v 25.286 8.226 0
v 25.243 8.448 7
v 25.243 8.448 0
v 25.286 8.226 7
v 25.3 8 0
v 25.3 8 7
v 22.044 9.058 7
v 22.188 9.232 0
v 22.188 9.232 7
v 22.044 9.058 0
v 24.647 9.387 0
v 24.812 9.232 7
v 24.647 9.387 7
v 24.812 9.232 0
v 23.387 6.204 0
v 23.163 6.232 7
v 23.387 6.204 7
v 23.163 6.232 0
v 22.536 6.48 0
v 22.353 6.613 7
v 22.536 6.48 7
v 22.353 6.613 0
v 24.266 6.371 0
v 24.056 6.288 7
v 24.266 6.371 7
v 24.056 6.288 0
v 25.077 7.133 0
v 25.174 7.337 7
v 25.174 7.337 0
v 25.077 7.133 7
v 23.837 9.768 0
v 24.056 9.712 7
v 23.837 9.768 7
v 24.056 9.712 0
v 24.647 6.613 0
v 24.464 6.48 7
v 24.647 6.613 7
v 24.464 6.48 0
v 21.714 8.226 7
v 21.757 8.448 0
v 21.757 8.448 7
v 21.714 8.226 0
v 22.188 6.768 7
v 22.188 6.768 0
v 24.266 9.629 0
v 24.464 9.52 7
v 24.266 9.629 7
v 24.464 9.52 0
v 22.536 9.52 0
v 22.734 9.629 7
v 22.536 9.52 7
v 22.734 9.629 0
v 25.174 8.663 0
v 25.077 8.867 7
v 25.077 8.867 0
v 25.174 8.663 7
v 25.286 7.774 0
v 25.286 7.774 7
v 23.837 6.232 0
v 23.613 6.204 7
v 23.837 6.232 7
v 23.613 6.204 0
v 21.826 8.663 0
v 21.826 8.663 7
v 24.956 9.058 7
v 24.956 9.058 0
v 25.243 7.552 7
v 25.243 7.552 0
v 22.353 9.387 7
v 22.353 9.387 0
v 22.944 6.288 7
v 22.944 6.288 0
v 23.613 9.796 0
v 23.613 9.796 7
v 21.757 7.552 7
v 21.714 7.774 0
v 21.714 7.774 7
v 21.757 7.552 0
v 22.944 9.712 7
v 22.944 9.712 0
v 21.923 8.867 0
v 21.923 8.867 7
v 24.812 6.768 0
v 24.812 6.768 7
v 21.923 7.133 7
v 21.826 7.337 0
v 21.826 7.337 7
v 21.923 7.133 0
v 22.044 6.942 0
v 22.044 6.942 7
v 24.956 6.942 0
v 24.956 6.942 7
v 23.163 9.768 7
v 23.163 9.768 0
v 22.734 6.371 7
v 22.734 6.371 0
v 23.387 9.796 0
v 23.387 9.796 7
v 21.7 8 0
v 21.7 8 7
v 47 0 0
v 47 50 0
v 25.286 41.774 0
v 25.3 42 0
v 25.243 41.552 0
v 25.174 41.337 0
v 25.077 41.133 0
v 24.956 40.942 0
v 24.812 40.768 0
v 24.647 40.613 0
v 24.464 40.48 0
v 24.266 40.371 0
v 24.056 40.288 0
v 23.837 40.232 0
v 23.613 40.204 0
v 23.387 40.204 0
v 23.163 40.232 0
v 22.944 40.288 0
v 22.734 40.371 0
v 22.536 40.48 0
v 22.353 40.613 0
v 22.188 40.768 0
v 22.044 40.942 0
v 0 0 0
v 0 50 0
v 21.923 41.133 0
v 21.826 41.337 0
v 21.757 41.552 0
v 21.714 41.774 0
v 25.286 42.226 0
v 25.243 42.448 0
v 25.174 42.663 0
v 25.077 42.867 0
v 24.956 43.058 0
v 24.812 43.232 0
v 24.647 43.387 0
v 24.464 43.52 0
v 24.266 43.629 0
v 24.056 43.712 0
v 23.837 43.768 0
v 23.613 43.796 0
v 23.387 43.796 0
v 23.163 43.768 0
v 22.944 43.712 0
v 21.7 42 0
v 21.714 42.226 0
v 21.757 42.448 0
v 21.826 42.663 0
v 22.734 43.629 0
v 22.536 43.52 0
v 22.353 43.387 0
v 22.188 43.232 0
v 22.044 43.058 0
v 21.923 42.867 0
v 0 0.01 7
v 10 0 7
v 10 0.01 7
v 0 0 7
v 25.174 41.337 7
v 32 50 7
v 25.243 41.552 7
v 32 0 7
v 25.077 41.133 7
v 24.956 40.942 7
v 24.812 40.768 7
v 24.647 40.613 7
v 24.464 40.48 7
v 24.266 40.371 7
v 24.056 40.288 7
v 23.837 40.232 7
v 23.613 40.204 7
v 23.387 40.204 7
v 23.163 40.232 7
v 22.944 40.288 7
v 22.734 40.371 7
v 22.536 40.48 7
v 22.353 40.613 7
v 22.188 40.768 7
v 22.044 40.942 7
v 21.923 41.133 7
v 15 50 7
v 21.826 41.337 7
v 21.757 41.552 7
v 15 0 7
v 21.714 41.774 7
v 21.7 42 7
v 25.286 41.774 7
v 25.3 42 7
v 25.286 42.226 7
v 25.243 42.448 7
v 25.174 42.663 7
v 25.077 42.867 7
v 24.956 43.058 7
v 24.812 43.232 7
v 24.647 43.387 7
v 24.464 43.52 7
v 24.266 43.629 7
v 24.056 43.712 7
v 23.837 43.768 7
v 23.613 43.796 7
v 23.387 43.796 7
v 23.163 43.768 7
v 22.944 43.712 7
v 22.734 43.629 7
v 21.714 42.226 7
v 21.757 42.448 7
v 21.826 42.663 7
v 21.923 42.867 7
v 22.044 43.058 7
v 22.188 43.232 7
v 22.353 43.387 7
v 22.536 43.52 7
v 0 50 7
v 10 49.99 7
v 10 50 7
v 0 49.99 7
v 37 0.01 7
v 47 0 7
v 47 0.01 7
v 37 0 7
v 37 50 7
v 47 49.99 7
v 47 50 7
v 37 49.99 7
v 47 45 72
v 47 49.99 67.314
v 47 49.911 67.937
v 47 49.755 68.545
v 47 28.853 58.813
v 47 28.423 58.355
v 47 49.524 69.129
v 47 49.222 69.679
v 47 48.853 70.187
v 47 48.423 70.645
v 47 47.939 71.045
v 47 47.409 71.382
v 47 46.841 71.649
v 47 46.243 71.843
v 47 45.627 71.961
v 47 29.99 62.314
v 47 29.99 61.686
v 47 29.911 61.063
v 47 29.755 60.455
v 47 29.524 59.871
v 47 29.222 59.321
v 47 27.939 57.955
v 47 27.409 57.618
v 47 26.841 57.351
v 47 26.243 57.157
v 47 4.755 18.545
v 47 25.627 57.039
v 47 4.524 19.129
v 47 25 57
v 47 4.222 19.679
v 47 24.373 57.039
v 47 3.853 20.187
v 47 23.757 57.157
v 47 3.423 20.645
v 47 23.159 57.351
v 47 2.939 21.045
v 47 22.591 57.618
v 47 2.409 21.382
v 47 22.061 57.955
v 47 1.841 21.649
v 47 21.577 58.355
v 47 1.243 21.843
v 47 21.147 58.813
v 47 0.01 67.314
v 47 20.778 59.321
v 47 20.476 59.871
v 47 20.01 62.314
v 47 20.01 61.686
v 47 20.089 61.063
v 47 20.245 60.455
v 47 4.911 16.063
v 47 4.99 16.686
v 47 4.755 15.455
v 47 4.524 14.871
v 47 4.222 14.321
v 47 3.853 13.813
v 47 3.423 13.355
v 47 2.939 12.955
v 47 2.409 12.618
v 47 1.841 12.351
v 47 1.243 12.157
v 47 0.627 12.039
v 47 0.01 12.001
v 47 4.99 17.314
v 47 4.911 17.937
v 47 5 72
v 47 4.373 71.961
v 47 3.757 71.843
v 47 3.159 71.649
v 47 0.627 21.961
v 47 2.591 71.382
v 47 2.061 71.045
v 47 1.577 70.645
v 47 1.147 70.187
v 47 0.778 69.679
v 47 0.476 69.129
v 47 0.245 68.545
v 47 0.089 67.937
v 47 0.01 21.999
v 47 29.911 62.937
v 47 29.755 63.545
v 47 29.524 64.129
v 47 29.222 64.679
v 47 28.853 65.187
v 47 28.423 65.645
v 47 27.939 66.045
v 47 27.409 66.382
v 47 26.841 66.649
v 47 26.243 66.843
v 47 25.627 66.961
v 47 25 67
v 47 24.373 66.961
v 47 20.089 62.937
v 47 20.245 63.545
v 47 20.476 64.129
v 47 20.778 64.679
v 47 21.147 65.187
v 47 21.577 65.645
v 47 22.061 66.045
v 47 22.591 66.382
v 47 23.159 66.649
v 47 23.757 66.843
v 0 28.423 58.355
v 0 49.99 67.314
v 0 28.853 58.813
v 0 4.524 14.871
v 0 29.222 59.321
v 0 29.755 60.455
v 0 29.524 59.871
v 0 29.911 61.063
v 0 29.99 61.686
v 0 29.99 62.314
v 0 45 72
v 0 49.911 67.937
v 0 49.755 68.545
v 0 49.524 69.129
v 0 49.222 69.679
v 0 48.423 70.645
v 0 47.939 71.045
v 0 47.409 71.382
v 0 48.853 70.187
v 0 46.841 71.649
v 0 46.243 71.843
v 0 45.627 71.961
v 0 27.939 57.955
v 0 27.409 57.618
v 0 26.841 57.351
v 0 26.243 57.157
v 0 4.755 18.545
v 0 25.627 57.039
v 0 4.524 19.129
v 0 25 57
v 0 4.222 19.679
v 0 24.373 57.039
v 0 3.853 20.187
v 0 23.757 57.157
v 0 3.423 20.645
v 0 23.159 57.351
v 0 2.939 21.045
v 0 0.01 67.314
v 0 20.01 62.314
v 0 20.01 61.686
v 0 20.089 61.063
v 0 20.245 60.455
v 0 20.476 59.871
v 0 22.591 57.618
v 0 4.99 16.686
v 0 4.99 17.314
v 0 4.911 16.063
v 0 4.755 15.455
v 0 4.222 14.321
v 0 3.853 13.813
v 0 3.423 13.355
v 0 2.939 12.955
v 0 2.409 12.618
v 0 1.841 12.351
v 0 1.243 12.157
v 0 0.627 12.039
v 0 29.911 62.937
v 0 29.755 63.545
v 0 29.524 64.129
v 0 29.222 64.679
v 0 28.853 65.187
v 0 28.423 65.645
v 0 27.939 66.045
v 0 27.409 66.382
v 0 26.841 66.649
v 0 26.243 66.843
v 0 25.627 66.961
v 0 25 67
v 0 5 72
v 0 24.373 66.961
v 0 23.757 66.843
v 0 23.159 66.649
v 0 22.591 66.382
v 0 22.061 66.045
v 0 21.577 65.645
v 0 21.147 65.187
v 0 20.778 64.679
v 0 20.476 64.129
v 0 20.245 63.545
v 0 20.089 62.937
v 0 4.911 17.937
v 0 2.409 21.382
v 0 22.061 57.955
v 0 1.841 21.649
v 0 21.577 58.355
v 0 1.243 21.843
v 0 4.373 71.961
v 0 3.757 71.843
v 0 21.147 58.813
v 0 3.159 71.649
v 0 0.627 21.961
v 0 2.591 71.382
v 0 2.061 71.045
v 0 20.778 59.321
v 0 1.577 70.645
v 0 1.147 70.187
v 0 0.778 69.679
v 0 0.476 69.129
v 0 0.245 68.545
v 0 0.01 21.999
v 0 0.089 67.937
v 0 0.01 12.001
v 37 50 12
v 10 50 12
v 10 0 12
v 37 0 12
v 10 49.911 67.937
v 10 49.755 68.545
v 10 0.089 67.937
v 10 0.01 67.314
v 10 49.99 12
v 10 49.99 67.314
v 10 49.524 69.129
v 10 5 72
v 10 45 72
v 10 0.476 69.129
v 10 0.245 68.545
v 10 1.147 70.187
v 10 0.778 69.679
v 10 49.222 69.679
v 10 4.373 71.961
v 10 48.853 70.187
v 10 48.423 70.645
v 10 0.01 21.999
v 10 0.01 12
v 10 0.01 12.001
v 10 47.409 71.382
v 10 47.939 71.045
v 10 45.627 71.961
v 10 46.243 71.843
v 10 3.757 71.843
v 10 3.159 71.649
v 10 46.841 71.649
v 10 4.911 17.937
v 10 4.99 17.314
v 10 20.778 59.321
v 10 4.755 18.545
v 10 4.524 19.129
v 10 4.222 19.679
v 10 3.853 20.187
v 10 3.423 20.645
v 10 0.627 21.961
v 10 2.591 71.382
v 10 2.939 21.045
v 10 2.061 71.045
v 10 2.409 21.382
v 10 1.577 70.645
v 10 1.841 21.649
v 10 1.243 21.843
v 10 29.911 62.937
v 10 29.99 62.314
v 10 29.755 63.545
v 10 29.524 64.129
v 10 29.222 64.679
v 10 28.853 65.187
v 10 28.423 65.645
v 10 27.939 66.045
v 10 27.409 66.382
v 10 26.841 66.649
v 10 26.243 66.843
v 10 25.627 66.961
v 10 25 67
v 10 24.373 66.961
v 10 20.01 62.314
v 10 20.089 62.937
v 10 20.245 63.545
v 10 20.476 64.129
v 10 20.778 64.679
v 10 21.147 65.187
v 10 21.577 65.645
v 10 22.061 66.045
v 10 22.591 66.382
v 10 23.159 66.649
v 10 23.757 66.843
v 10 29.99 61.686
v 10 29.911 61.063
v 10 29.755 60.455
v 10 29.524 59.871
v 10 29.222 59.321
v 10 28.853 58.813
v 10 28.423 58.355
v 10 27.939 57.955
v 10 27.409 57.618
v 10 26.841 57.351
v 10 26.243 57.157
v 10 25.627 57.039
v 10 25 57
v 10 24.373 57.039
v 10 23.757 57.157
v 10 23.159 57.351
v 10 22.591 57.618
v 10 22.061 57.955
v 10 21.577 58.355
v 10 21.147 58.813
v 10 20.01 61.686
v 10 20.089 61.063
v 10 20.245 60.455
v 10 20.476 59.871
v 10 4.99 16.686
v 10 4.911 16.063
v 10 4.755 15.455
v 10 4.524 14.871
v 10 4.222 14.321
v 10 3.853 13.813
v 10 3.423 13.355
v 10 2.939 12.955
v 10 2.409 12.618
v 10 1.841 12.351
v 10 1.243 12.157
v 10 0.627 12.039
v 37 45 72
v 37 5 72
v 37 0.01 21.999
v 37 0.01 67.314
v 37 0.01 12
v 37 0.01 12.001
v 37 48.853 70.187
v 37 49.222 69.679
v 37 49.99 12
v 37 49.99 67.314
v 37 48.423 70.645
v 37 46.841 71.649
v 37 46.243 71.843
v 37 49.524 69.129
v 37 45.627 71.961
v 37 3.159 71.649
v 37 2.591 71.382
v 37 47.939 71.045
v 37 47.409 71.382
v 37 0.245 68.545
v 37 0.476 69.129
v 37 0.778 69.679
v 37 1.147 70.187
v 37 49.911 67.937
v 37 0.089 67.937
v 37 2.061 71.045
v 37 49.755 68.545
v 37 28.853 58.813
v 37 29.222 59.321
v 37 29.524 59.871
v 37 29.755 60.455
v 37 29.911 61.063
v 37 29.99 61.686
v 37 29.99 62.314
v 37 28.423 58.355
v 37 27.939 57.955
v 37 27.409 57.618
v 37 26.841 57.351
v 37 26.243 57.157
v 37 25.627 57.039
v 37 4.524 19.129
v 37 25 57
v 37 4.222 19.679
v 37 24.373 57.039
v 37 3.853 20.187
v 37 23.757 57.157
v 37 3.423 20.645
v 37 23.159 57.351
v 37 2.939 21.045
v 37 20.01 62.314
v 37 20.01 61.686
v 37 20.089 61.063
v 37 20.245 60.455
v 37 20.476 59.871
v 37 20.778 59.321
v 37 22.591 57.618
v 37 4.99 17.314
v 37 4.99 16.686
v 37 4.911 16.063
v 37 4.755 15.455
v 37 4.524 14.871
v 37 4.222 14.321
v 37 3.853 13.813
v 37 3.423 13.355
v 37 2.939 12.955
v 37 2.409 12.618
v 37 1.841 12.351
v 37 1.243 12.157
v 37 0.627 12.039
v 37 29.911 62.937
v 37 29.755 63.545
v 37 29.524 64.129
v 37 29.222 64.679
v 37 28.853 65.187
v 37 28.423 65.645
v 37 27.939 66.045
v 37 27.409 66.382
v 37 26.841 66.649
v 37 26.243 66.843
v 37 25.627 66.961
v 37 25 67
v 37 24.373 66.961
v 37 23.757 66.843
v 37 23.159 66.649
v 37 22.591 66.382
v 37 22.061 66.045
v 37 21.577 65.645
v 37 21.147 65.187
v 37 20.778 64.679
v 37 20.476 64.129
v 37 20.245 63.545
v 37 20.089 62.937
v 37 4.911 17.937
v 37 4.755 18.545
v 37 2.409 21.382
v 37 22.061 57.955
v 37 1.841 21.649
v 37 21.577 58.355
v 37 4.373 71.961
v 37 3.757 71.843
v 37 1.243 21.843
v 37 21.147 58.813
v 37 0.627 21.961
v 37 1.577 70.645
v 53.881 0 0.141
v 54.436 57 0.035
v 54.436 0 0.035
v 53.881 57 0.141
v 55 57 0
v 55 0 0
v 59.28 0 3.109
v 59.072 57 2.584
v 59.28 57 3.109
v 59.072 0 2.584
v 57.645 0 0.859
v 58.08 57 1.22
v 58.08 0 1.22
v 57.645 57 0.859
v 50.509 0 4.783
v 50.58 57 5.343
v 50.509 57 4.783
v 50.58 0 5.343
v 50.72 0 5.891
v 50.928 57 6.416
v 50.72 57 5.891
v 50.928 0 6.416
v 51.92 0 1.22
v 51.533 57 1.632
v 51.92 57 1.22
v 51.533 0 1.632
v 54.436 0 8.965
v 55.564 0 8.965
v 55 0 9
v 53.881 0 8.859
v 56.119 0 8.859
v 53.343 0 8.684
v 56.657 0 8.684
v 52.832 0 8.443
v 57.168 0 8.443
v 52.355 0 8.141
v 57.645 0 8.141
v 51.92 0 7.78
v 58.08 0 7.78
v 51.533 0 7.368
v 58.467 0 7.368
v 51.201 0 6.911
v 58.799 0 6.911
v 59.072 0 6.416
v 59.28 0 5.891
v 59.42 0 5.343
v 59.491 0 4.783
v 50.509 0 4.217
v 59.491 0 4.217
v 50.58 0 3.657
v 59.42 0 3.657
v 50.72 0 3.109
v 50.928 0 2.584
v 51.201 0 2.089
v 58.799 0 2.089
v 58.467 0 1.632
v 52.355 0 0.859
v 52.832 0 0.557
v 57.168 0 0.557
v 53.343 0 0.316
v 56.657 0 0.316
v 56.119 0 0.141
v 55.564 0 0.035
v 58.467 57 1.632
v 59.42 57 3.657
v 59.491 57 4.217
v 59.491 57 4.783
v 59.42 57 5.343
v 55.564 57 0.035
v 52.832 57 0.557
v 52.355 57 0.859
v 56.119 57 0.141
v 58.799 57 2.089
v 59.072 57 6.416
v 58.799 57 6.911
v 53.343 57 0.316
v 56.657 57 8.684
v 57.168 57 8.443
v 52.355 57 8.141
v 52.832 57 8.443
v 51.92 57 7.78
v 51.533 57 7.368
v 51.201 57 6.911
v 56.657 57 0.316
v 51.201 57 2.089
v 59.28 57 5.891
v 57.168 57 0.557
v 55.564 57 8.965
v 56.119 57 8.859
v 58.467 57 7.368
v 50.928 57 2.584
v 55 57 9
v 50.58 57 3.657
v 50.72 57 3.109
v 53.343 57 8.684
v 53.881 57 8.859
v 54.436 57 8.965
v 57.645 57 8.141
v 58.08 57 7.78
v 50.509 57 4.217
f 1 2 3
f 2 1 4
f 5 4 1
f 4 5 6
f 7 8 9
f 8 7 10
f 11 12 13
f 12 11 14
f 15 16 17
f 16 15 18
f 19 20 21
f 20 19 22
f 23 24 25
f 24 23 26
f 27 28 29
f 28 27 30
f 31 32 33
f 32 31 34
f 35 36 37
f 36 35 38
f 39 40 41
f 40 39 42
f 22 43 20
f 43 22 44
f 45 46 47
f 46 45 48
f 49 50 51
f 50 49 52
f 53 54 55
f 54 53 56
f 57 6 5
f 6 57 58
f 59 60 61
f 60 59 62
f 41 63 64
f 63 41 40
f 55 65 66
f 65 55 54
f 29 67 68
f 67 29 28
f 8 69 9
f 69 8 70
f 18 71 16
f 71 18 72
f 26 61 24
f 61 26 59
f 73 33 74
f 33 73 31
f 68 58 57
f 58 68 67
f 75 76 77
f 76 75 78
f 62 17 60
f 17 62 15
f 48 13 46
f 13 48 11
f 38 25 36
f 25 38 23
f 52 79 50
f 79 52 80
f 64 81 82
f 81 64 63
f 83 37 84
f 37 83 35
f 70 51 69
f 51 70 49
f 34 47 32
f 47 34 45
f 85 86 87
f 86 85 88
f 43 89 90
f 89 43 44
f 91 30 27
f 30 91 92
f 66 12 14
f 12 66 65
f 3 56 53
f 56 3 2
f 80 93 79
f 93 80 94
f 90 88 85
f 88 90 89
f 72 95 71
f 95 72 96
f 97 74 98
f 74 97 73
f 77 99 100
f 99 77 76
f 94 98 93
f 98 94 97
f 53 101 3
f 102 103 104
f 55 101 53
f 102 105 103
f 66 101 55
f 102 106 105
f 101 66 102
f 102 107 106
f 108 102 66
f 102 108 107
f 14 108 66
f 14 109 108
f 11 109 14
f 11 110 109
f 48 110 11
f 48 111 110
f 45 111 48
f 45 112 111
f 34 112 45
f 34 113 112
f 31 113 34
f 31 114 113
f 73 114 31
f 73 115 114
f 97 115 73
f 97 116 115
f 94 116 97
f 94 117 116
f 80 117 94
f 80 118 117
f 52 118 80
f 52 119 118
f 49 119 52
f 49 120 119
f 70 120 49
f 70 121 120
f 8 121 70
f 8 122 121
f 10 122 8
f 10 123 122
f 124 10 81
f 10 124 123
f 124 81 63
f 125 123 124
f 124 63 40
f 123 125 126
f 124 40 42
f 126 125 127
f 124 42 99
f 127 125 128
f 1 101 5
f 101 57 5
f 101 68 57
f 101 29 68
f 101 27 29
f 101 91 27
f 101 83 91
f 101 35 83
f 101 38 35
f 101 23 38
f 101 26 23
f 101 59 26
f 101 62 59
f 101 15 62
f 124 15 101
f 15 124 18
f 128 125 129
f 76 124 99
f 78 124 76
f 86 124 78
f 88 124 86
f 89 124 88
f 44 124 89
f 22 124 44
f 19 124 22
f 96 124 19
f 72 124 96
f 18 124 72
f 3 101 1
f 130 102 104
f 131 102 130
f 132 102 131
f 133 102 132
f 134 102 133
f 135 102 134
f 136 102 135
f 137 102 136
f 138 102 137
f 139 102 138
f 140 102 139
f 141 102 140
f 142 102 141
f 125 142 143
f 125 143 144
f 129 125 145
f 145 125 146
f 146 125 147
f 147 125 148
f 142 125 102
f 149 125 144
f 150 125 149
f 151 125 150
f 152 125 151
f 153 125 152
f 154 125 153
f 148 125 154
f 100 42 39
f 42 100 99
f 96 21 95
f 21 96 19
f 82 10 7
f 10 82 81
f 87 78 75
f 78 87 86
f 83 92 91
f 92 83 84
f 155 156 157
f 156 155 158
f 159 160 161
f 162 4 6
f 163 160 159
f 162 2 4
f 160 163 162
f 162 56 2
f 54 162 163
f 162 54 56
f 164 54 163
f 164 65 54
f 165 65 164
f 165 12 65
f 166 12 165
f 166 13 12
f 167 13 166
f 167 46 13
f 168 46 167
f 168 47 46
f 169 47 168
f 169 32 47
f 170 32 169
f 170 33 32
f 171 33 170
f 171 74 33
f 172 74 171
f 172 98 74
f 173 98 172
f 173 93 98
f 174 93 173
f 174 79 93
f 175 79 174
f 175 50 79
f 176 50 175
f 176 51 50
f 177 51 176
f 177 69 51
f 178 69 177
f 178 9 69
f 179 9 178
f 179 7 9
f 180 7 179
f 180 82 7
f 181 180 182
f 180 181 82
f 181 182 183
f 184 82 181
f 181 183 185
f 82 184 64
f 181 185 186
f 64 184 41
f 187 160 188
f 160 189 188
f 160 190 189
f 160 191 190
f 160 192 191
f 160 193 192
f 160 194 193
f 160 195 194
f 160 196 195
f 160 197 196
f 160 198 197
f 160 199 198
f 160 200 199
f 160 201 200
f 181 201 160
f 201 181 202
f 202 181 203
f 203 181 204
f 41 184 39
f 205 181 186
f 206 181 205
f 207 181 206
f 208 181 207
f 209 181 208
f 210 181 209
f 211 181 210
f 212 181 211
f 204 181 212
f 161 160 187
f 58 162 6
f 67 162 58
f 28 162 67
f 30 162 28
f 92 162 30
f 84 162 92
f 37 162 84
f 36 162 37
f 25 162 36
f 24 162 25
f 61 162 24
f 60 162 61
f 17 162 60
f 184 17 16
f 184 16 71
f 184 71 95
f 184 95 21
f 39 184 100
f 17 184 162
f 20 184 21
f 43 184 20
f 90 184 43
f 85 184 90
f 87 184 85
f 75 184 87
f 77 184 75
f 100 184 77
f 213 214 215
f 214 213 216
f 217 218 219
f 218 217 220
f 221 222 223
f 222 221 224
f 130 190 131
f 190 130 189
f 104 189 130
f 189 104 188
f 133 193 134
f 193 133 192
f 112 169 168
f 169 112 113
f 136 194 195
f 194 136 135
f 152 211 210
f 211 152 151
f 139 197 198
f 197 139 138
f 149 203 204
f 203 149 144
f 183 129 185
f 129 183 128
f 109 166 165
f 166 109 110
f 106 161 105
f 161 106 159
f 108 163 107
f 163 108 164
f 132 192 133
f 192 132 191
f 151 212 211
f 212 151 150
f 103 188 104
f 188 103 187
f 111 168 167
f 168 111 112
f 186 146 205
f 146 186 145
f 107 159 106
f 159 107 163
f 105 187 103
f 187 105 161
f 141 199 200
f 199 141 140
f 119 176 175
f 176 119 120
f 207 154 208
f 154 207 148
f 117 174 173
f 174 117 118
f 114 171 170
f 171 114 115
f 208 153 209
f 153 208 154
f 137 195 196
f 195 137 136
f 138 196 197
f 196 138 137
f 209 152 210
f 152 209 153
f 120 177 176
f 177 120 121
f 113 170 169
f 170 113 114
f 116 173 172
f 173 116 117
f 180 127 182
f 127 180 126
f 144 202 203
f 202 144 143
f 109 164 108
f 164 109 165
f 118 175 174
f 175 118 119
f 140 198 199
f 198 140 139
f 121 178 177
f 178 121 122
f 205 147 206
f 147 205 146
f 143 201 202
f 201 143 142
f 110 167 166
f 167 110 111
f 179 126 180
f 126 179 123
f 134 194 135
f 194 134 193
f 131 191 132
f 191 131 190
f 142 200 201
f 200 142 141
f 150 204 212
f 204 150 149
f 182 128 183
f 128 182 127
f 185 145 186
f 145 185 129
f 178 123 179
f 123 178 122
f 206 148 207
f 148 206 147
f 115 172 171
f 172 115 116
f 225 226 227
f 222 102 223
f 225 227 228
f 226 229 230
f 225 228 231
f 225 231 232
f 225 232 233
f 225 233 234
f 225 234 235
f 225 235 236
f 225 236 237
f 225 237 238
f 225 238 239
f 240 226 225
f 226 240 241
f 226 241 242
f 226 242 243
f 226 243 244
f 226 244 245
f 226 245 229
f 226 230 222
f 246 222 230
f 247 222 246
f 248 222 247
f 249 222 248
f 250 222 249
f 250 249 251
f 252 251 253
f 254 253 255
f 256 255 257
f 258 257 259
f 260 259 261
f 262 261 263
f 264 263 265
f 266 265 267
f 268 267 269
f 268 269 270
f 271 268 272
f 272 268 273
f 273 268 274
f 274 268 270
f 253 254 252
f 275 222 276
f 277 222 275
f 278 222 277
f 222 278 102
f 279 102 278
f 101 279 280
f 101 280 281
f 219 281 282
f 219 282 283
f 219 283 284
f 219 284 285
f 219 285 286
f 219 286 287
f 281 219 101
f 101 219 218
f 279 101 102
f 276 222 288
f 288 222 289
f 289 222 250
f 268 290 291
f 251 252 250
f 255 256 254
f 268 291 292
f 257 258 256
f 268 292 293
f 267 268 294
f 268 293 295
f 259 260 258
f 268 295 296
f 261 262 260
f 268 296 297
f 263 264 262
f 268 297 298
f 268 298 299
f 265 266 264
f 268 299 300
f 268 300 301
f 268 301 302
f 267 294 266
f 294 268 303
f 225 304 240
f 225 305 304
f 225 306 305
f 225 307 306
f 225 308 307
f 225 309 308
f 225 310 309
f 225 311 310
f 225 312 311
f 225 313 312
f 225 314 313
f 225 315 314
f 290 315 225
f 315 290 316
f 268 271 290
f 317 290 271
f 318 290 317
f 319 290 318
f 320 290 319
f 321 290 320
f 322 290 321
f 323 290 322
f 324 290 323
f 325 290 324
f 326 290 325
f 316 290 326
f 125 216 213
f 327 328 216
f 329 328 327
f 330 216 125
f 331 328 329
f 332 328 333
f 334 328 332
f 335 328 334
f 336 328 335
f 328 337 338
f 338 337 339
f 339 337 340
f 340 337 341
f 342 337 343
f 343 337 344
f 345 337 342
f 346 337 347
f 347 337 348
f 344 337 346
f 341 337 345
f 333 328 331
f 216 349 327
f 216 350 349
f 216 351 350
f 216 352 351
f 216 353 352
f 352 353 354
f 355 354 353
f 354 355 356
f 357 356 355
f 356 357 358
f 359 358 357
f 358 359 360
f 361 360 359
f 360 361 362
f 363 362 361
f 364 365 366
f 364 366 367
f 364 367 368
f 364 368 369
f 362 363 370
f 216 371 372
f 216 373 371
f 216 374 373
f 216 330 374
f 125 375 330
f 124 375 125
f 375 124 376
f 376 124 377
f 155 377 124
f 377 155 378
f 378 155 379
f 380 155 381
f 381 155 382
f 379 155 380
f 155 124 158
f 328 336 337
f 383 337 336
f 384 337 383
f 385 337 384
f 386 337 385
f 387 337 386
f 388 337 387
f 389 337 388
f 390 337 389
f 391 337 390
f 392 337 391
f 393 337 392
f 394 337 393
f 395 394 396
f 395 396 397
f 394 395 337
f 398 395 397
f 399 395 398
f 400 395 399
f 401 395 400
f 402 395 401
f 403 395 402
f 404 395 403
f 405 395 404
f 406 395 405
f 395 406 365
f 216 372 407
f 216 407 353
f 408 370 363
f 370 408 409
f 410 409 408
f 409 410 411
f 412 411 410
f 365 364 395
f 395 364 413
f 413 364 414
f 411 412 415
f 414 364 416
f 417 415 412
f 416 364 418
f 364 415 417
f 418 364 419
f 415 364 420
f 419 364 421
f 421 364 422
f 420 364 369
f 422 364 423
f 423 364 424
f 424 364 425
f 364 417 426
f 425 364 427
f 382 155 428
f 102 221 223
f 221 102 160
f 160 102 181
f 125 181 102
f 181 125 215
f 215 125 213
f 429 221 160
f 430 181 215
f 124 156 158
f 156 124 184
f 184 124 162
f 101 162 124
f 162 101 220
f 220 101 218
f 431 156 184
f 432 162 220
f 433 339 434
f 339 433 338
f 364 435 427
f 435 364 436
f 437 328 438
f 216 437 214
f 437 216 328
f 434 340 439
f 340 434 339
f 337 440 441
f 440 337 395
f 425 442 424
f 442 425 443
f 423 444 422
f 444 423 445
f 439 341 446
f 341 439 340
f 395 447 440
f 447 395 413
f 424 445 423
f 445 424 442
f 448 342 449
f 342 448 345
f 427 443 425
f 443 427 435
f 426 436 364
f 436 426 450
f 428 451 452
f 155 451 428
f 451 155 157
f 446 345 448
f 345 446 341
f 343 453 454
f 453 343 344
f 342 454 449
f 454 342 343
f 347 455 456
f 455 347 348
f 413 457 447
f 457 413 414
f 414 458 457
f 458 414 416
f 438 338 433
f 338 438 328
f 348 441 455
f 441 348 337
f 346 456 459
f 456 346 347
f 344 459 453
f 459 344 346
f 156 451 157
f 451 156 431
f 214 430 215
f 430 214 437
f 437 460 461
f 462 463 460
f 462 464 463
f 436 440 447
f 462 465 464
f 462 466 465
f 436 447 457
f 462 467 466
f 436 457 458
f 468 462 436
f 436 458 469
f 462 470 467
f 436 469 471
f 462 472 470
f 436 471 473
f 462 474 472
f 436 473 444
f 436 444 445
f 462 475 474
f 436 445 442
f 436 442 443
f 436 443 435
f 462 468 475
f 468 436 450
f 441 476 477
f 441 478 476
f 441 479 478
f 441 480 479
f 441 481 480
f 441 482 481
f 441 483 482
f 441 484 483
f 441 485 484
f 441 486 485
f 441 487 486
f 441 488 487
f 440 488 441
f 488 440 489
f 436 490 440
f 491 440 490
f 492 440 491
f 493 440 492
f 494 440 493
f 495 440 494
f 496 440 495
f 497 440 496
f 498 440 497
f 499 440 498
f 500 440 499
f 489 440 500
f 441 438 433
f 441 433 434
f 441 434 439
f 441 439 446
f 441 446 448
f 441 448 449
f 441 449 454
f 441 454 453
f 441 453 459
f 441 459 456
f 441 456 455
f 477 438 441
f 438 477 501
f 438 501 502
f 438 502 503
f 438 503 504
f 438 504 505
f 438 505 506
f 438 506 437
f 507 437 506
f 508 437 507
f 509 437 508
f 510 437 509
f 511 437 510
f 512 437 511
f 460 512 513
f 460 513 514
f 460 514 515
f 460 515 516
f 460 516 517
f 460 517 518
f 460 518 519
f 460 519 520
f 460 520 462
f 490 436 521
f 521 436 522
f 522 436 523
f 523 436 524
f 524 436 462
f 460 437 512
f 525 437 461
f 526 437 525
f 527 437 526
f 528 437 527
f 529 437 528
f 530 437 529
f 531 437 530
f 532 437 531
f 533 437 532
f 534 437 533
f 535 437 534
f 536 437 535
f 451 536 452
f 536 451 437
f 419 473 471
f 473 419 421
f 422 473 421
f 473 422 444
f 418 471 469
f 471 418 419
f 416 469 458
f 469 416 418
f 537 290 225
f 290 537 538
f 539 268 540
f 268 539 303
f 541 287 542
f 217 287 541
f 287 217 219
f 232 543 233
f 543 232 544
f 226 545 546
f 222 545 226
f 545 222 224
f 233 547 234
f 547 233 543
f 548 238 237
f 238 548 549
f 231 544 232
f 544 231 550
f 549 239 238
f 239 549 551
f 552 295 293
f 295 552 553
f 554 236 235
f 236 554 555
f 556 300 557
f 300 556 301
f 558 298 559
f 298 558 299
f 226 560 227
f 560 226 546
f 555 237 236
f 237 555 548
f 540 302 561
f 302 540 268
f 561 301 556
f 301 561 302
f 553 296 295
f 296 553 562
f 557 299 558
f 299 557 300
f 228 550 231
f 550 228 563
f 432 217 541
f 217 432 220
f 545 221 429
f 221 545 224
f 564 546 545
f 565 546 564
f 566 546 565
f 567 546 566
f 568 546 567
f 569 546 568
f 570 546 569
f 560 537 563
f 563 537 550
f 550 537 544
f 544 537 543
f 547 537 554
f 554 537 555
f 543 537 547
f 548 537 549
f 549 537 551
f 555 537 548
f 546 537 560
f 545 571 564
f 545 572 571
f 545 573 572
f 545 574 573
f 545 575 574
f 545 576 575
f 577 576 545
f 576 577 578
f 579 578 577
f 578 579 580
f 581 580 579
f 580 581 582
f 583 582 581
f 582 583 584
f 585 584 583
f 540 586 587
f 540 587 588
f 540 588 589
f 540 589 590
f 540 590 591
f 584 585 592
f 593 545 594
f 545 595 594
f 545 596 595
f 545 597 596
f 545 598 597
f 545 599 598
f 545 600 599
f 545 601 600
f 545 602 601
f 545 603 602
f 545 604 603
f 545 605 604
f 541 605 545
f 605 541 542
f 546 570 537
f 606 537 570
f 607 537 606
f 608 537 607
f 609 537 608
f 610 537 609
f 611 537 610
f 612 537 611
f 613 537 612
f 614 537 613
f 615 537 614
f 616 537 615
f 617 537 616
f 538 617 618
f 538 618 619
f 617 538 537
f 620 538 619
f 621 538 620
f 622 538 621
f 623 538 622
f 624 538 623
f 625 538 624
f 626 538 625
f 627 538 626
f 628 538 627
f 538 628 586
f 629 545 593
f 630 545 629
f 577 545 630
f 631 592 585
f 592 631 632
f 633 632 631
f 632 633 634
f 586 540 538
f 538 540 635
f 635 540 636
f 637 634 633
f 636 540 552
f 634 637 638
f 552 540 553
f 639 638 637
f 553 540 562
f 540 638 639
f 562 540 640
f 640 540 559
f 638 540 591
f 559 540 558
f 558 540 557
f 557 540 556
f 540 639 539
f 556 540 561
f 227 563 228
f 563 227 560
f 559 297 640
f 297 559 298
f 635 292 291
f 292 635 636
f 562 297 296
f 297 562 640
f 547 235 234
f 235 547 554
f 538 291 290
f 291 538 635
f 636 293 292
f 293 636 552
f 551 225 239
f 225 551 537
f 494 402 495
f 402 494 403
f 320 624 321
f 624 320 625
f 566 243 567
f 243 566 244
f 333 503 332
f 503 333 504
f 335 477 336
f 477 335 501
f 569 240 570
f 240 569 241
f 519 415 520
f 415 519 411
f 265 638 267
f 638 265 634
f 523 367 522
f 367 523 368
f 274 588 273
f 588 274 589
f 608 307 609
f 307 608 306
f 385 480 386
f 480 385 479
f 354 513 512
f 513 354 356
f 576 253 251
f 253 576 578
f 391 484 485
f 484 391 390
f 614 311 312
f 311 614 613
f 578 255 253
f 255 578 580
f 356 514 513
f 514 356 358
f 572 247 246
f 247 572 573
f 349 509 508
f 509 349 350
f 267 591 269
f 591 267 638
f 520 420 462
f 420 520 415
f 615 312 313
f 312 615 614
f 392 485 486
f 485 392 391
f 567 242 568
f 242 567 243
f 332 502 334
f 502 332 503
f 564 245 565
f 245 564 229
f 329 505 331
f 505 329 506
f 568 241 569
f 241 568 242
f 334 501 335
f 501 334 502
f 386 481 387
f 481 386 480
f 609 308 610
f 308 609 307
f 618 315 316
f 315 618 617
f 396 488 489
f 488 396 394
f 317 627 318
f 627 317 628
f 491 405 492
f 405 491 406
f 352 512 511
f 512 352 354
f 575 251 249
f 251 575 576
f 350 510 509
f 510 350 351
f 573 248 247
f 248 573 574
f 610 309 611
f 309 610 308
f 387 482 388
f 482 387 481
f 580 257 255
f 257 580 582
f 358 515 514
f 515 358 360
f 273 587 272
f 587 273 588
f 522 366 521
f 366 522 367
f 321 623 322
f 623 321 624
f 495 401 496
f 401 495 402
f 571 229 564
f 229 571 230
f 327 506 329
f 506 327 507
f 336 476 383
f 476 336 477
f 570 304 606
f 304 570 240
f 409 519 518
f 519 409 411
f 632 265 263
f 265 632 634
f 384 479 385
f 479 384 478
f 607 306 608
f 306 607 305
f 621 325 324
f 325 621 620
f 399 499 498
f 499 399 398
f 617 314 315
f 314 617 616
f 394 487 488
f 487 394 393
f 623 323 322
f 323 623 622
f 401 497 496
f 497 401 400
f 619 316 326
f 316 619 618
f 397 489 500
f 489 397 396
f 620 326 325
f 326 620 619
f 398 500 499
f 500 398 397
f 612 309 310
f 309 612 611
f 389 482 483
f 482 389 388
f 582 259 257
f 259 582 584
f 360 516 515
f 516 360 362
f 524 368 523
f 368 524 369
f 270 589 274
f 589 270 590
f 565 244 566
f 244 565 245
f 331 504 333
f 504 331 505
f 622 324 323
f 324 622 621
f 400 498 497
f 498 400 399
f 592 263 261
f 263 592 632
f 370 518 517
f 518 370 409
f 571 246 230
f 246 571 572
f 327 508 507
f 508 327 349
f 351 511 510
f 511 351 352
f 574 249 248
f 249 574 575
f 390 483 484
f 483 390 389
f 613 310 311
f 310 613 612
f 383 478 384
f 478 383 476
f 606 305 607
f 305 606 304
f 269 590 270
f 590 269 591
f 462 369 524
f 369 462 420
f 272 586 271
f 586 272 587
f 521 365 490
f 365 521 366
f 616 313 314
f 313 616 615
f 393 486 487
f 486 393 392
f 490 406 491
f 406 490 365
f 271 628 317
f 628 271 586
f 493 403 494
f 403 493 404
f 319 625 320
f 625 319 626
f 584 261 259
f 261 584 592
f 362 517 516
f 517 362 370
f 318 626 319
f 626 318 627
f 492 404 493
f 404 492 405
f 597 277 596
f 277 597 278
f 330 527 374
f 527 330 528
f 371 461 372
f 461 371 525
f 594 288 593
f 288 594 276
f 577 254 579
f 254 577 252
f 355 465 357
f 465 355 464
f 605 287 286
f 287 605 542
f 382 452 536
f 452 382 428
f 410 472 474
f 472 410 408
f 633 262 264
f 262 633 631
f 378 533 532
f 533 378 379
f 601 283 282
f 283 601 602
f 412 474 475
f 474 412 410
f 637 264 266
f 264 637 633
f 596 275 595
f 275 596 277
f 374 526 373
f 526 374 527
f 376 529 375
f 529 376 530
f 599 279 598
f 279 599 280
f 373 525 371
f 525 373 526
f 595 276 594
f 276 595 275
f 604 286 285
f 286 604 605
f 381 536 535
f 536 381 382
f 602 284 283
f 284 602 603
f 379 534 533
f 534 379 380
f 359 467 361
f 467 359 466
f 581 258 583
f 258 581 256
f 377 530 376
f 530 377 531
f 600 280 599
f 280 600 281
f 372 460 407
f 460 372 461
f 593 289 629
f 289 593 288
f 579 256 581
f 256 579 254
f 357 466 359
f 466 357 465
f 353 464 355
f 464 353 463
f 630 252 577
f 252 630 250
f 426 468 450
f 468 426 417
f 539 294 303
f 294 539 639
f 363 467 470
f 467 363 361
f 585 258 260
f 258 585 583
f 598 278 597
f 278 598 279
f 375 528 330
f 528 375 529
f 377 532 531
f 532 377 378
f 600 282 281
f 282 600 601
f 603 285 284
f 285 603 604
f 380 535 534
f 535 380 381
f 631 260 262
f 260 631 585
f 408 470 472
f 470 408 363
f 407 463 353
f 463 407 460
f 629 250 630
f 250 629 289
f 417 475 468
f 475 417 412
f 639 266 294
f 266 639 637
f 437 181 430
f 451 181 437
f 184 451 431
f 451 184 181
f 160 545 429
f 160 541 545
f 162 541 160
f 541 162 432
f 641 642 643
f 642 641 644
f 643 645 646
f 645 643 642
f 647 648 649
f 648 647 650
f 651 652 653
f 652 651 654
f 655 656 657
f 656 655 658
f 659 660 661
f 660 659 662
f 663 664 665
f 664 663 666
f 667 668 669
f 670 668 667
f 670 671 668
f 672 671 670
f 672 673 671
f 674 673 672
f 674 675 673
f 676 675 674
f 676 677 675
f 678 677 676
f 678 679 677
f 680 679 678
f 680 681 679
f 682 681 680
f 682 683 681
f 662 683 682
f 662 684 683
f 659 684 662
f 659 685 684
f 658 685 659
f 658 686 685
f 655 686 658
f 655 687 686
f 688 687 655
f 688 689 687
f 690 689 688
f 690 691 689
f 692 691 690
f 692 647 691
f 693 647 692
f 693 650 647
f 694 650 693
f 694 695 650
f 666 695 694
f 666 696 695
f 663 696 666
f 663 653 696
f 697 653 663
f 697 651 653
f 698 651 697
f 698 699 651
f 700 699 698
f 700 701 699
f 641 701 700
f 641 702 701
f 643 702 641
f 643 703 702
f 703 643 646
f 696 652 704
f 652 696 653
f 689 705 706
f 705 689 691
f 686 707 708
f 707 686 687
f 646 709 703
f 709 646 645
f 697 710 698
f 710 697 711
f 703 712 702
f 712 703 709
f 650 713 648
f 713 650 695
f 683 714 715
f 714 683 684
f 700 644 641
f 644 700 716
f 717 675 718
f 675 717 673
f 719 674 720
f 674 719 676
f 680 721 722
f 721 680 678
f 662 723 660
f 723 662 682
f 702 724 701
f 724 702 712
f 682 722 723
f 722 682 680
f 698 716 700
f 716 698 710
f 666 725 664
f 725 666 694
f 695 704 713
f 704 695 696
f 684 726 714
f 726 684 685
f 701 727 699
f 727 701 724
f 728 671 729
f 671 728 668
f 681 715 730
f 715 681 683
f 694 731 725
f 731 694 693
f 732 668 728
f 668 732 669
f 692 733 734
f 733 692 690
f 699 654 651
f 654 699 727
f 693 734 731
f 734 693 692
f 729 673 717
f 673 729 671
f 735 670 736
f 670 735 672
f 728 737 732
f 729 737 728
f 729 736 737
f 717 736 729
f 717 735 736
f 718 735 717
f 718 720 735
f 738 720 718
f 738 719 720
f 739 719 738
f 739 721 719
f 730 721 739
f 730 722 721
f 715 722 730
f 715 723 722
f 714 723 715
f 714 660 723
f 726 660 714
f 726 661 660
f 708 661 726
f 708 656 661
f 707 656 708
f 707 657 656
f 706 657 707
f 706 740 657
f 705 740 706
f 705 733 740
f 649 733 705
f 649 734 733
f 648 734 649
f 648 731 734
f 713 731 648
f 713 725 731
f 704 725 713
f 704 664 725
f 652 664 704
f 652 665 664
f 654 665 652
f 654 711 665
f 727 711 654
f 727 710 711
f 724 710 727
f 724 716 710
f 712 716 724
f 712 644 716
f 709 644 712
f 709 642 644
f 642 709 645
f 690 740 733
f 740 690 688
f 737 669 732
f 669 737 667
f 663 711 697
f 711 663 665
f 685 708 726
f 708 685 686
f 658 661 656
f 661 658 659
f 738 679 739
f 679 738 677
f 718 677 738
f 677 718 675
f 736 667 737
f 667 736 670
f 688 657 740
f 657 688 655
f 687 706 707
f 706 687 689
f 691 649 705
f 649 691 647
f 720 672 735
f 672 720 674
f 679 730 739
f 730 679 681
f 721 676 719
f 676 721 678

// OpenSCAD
TIRE_SIZE = 50; // Distance between outer and inner tire circumference + wiggle room
INNER_WIDTH = 27; // Width of tire in mm + wiggle room
HEIGHT = 50; // Height of whole assembly
SIDE_THICKNESS = 10; // How thick the side walls are
BACK_THICKNESS = 7; // How thick the back wall is
SCREW_SPACING = 8; // mm from top/bot edge
SCREW_RADIUS = 1.8; // mm
ROD_RADIUS = 5; // size of hole
ROD_SPACING = 5; // distance between rod hole and edge
ROD_OVERFLOW = 10; // how much longer the rod is than the gap between sides
CORNER_THICKNESS = 5; // thickness of corner supports

$fn=50;
DEPTH = TIRE_SIZE + ROD_RADIUS * 2 + ROD_SPACING + BACK_THICKNESS;
difference(){
    union(){
        // Back support
        difference(){            
            cube([INNER_WIDTH+SIDE_THICKNESS*2, HEIGHT ,BACK_THICKNESS]);
            
            translate([SIDE_THICKNESS + INNER_WIDTH/2, SCREW_SPACING, 0])
            union(){
                cylinder(BACK_THICKNESS, SCREW_RADIUS, SCREW_RADIUS); 
                translate([0, HEIGHT - SCREW_SPACING*2, 0])
                cylinder(BACK_THICKNESS, SCREW_RADIUS, SCREW_RADIUS);
            }
        }
        
        // Sides
        translate([0,SIDE_THICKNESS/2,SIDE_THICKNESS/2])
        union(){
            minkowski(){
                cube([SIDE_THICKNESS/2, HEIGHT - SIDE_THICKNESS, DEPTH - SIDE_THICKNESS]);
                rotate([0,90,0])
                cylinder(r=SIDE_THICKNESS/2,SIDE_THICKNESS/2);
            }  
            translate([INNER_WIDTH + SIDE_THICKNESS, 0, 0])
            minkowski(){
                cube([SIDE_THICKNESS/2, HEIGHT - SIDE_THICKNESS, DEPTH - SIDE_THICKNESS]);
                rotate([0,90,0])
                cylinder(r=SIDE_THICKNESS/2,SIDE_THICKNESS/2);
            }
        }
    }
        
    union(){
        // Hole for bar
        translate([0, HEIGHT/2, DEPTH - ROD_RADIUS - ROD_SPACING])
        rotate([0,90,0])
        cylinder(INNER_WIDTH + SIDE_THICKNESS * 2, 5, 5);    
        // Notch along top edge for bar
        translate([0, 0, BACK_THICKNESS + CORNER_THICKNESS + ROD_RADIUS])
        rotate([0,90,0])
        cylinder(INNER_WIDTH + SIDE_THICKNESS * 2, 5, 5);       
    }
    
}

// Triangular corner supports
module triangular_prism(l, w, h) {
       polyhedron(points=[
               [0,0,h],
               [0,0,0],[w,0,0],
               [0,l,h],
               [0,l,0],[w,l,0]
       ], faces=[
               [0,2,1],
               [3,4,5],
               [0,1,4,3],
               [1,2,5,4],
               [0,3,5,2],
       ]);
}

translate([SIDE_THICKNESS, 0, BACK_THICKNESS])
triangular_prism(HEIGHT, CORNER_THICKNESS, CORNER_THICKNESS);


translate([SIDE_THICKNESS+INNER_WIDTH, 0, BACK_THICKNESS])
rotate([0,270,0])
triangular_prism(HEIGHT, CORNER_THICKNESS, CORNER_THICKNESS);

// Rod
translate([SIDE_THICKNESS * 2 + INNER_WIDTH + ROD_RADIUS + 3, 0, ROD_RADIUS - 0.5])
rotate([0,90,90])
cylinder(INNER_WIDTH + SIDE_THICKNESS * 2 + ROD_OVERFLOW, ROD_RADIUS - 0.5, ROD_RADIUS - 0.5);
